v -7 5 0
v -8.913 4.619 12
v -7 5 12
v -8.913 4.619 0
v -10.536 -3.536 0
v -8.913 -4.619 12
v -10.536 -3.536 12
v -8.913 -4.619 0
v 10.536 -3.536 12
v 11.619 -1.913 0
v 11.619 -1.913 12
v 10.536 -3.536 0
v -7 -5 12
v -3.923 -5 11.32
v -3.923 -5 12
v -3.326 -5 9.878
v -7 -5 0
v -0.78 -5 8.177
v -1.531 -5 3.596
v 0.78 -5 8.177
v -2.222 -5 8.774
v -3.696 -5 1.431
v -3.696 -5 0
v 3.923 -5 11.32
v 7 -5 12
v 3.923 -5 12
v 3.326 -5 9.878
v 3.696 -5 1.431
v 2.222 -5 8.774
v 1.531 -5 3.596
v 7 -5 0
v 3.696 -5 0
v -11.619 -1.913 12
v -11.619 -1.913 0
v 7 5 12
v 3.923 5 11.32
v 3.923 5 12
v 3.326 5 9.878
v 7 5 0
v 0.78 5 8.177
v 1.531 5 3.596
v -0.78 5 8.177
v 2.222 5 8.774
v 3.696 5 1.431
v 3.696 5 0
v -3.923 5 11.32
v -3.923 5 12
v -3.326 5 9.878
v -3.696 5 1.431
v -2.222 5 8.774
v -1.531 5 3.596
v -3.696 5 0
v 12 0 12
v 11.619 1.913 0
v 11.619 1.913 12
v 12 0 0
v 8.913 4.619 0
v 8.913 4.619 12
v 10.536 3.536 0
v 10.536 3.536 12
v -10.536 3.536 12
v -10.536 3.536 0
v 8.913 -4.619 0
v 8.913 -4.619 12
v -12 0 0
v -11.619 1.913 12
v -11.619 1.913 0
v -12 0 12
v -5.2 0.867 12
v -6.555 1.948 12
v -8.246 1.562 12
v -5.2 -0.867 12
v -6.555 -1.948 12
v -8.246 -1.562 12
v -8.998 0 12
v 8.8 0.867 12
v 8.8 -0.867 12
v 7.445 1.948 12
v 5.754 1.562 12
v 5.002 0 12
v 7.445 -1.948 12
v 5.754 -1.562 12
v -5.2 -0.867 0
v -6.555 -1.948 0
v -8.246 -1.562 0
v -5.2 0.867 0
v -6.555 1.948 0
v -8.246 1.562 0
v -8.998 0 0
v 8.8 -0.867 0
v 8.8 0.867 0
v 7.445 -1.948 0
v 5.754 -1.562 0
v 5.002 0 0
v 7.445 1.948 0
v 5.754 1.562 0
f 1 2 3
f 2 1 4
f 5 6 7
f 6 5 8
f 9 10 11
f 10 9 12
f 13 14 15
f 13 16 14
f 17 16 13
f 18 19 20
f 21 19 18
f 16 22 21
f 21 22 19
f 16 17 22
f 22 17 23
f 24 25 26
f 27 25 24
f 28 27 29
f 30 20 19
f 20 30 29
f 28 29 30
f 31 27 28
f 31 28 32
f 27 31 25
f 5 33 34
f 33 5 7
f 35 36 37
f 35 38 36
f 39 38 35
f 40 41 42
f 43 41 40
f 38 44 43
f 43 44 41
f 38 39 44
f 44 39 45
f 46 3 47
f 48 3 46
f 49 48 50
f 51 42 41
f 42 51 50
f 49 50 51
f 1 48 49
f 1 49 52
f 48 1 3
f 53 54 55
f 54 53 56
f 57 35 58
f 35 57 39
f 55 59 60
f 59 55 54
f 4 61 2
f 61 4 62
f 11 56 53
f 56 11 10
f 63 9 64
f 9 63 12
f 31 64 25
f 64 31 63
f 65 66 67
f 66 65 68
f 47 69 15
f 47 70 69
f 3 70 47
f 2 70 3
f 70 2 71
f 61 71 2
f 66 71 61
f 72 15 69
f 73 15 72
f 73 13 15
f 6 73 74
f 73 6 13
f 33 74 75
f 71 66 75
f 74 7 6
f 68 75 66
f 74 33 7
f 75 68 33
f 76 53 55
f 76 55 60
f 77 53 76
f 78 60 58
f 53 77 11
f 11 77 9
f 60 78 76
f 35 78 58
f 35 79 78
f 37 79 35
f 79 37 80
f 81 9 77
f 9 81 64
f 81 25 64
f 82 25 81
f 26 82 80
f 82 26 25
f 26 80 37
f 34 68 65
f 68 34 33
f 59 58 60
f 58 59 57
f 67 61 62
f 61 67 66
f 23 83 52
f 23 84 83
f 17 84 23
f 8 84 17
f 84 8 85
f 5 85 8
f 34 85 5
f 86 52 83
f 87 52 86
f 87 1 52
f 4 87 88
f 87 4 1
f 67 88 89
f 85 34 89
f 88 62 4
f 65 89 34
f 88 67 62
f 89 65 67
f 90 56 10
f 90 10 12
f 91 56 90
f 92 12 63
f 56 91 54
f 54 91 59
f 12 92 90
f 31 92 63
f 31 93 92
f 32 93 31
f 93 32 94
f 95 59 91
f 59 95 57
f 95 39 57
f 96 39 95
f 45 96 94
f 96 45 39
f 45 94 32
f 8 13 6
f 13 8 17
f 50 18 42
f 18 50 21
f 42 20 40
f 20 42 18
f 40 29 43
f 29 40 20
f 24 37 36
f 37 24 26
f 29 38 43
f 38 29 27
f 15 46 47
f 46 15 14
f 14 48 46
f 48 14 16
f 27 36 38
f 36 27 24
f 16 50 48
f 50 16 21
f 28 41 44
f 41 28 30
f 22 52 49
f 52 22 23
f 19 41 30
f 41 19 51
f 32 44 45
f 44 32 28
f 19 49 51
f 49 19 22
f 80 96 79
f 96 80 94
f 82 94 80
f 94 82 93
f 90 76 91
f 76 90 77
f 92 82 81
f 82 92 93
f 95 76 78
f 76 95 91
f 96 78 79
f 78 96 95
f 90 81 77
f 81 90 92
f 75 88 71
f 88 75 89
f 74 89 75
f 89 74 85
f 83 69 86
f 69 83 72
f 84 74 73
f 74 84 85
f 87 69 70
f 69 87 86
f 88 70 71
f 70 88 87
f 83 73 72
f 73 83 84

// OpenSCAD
// file: functions.scad
// PRUSA Mendel  
// Functions used in many files
// GNU GPL v2
// Josef Průša
// josefprusa@me.com
// prusadjs.cz
// http://www.reprap.org/wiki/Prusa_Mendel
// http://github.com/prusajr/PrusaMendel

module nut( d, h, horizontal = true )
{
	cornerdiameter = ( d / 2 ) / cos( 180 / 6 );
	cylinder( h = h, r = cornerdiameter, $fn = 6 );
	if( horizontal )
	{
		for( i = [1 : 6] )
		{
			rotate( [0, 0, 60 * i] ) translate( [-cornerdiameter - 0.2, 0, 0] ) rotate( [0, 0, -45] ) cube( size = [2, 2, h] );
		}
	}
}

// By nophead
module polyhole( d, h ) 
{
	n = max( round( 2 * d ), 3 );
	rotate( [0, 0, 180] ) cylinder( h = h, r = ( d / 2 ) / cos( 180 / n ), $fn = n );
}

module roundcorner( diameter )
{
	difference()
	{
		cube( size = [diameter, diameter, 99], center = false );
		translate( v = [diameter, diameter, 0] ) cylinder( h = 100, r = diameter, center = true );
	}
}
// file: metric.scad
// PRUSA Mendel  
// Default metric sizes
// GNU GPL v2
// Josef Průša
// josefprusa@me.com
// prusadjs.cz
// http://www.reprap.org/wiki/Prusa_Mendel
// http://github.com/prusajr/PrusaMendel

// DONT CHANGE THIS FILE! ALTER VALUES IN CONFIGURATION.SCAD INSTEAD

// RODS

threaded_rod_diameter = 8.2;
threaded_rod_diameter_horizontal = 8.2;
smooth_bar_diameter = 8;
smooth_bar_diameter_horizontal = 8.5;

// Nuts and bolts

m8_diameter = 9;
m8_nut_diameter = 16.4;

m4_diameter = 4.5;
m4_nut_diameter = 9;

m3_diameter = 3.6;
m3_nut_diameter = 6.1;

// Bushing holder

bushing_core_diameter = smooth_bar_diameter;
bushing_material_thickness = 1;

// Motors

motor_shaft = 5.5;
// file: configuration.scad
// PRUSA Mendel  
// Configuration file
// GNU GPL v2
// Josef Průša
// josefprusa@me.com
// prusadjs.cz
// http://www.reprap.org/wiki/Prusa_Mendel
// http://github.com/prusajr/PrusaMendel

// PLEASE SELECT ONE OF THE CONFIGURATIONS BELOW
// BY UN-COMMENTING IT

// Uncomment for metric settings
// METRIC METRIC METRIC METRIC METRIC METRIC METRIC METRIC 

include <metric.scad>;

// Uncomment for imperial settings
// IMPERIAL IMPERIAL IMPERIAL IMPERIAL IMPERIAL IMPERIAL IMPERIAL 

//include <sae.scad>;

// CUSTOM CUSTOM CUSTOM CUSTOM CUSTOM CUSTOM CUSTOM CUSTOM CUSTOM

// Thin walls
layer_height = 0.3;
wot = 1.5;
filament_width = layer_height * wot;

thin_wall = 4 * layer_height * wot;

// LM8UU
linear = true;
linear_bearing_diameter = 15;
linear_bearing_length = 24;

//608 bearing
bearing_diameter = 22;
bearing_thickness = 7;

//Timing belt
belt_pitch = 5;

// CHANGE ONLY THE STUFF YOU KNOW
// IT WILL REPLACE DEFAULT SETTING

// RODS

// threaded_rod_diameter = 0;
// threaded_rod_diameter_horizontal = 0;
// smooth_bar_díameter = 0;
// smooth_bar_díameter_horizontal = 0;

// Nuts and bolts

// m8_diameter = 0;
// m8_nut_diameter = 0;
// m8_nut_thickness = 0;

// m4_diameter = 0;
 m4_nut_diameter = 8.5;
// m4_nut_thickness = 0;

// m3_diameter = 0;
// m3_nut_diameter = 0;
m3_nut_thickness = 3;

// Bushing holder

// bushing_core_diameter = smooth_bar_díameter;
// bushing_material_thickness = 0;

///counted stuff
m3_nut_diameter_bigger = ( ( m3_nut_diameter  / 2) / cos( 180 / 6 ) ) * 2;

// functions 
include <functions.scad>
// main file
// PRUSA Mendel  
// Rod clamp
// GNU GPL v2
// Josef Průša
// josefprusa@me.com
// prusadjs.cz
// http://www.reprap.org/wiki/Prusa_Mendel
// http://github.com/prusajr/PrusaMendel


include <configuration.scad>

/**
 * @id rod-clamp
 * @name Rod clamp
 * @category Printed
 */

rodclamp();
//%cube([200,200,0.01],center=true);

module rodclamp()
{ 
	difference ()
	{
		hull ()
		{ 
		translate ([7, 0, 0]) rotate ([0,0,0]) cylinder( r = 10 / 2, h = 12 );
		translate ([-7, 0, 0]) rotate ([0,0,0]) cylinder( r = 10 / 2, h = 12 );
		}
	
		translate ([0, 0, 12.1]) rotate ([90,11.25,0]) #cylinder( r = 4, h = 12, center = true, $fn=16 );
		translate ([0, 0, -.1]) rotate ([90,22.5,0]) #cylinder( r = 4, h = 12, center = true, $fn=8 );
		translate ([7, 0, -1]) polyhole( m3_diameter,14 );
		translate ([-7, 0, -1]) polyhole( m3_diameter,14 );
	}
}
